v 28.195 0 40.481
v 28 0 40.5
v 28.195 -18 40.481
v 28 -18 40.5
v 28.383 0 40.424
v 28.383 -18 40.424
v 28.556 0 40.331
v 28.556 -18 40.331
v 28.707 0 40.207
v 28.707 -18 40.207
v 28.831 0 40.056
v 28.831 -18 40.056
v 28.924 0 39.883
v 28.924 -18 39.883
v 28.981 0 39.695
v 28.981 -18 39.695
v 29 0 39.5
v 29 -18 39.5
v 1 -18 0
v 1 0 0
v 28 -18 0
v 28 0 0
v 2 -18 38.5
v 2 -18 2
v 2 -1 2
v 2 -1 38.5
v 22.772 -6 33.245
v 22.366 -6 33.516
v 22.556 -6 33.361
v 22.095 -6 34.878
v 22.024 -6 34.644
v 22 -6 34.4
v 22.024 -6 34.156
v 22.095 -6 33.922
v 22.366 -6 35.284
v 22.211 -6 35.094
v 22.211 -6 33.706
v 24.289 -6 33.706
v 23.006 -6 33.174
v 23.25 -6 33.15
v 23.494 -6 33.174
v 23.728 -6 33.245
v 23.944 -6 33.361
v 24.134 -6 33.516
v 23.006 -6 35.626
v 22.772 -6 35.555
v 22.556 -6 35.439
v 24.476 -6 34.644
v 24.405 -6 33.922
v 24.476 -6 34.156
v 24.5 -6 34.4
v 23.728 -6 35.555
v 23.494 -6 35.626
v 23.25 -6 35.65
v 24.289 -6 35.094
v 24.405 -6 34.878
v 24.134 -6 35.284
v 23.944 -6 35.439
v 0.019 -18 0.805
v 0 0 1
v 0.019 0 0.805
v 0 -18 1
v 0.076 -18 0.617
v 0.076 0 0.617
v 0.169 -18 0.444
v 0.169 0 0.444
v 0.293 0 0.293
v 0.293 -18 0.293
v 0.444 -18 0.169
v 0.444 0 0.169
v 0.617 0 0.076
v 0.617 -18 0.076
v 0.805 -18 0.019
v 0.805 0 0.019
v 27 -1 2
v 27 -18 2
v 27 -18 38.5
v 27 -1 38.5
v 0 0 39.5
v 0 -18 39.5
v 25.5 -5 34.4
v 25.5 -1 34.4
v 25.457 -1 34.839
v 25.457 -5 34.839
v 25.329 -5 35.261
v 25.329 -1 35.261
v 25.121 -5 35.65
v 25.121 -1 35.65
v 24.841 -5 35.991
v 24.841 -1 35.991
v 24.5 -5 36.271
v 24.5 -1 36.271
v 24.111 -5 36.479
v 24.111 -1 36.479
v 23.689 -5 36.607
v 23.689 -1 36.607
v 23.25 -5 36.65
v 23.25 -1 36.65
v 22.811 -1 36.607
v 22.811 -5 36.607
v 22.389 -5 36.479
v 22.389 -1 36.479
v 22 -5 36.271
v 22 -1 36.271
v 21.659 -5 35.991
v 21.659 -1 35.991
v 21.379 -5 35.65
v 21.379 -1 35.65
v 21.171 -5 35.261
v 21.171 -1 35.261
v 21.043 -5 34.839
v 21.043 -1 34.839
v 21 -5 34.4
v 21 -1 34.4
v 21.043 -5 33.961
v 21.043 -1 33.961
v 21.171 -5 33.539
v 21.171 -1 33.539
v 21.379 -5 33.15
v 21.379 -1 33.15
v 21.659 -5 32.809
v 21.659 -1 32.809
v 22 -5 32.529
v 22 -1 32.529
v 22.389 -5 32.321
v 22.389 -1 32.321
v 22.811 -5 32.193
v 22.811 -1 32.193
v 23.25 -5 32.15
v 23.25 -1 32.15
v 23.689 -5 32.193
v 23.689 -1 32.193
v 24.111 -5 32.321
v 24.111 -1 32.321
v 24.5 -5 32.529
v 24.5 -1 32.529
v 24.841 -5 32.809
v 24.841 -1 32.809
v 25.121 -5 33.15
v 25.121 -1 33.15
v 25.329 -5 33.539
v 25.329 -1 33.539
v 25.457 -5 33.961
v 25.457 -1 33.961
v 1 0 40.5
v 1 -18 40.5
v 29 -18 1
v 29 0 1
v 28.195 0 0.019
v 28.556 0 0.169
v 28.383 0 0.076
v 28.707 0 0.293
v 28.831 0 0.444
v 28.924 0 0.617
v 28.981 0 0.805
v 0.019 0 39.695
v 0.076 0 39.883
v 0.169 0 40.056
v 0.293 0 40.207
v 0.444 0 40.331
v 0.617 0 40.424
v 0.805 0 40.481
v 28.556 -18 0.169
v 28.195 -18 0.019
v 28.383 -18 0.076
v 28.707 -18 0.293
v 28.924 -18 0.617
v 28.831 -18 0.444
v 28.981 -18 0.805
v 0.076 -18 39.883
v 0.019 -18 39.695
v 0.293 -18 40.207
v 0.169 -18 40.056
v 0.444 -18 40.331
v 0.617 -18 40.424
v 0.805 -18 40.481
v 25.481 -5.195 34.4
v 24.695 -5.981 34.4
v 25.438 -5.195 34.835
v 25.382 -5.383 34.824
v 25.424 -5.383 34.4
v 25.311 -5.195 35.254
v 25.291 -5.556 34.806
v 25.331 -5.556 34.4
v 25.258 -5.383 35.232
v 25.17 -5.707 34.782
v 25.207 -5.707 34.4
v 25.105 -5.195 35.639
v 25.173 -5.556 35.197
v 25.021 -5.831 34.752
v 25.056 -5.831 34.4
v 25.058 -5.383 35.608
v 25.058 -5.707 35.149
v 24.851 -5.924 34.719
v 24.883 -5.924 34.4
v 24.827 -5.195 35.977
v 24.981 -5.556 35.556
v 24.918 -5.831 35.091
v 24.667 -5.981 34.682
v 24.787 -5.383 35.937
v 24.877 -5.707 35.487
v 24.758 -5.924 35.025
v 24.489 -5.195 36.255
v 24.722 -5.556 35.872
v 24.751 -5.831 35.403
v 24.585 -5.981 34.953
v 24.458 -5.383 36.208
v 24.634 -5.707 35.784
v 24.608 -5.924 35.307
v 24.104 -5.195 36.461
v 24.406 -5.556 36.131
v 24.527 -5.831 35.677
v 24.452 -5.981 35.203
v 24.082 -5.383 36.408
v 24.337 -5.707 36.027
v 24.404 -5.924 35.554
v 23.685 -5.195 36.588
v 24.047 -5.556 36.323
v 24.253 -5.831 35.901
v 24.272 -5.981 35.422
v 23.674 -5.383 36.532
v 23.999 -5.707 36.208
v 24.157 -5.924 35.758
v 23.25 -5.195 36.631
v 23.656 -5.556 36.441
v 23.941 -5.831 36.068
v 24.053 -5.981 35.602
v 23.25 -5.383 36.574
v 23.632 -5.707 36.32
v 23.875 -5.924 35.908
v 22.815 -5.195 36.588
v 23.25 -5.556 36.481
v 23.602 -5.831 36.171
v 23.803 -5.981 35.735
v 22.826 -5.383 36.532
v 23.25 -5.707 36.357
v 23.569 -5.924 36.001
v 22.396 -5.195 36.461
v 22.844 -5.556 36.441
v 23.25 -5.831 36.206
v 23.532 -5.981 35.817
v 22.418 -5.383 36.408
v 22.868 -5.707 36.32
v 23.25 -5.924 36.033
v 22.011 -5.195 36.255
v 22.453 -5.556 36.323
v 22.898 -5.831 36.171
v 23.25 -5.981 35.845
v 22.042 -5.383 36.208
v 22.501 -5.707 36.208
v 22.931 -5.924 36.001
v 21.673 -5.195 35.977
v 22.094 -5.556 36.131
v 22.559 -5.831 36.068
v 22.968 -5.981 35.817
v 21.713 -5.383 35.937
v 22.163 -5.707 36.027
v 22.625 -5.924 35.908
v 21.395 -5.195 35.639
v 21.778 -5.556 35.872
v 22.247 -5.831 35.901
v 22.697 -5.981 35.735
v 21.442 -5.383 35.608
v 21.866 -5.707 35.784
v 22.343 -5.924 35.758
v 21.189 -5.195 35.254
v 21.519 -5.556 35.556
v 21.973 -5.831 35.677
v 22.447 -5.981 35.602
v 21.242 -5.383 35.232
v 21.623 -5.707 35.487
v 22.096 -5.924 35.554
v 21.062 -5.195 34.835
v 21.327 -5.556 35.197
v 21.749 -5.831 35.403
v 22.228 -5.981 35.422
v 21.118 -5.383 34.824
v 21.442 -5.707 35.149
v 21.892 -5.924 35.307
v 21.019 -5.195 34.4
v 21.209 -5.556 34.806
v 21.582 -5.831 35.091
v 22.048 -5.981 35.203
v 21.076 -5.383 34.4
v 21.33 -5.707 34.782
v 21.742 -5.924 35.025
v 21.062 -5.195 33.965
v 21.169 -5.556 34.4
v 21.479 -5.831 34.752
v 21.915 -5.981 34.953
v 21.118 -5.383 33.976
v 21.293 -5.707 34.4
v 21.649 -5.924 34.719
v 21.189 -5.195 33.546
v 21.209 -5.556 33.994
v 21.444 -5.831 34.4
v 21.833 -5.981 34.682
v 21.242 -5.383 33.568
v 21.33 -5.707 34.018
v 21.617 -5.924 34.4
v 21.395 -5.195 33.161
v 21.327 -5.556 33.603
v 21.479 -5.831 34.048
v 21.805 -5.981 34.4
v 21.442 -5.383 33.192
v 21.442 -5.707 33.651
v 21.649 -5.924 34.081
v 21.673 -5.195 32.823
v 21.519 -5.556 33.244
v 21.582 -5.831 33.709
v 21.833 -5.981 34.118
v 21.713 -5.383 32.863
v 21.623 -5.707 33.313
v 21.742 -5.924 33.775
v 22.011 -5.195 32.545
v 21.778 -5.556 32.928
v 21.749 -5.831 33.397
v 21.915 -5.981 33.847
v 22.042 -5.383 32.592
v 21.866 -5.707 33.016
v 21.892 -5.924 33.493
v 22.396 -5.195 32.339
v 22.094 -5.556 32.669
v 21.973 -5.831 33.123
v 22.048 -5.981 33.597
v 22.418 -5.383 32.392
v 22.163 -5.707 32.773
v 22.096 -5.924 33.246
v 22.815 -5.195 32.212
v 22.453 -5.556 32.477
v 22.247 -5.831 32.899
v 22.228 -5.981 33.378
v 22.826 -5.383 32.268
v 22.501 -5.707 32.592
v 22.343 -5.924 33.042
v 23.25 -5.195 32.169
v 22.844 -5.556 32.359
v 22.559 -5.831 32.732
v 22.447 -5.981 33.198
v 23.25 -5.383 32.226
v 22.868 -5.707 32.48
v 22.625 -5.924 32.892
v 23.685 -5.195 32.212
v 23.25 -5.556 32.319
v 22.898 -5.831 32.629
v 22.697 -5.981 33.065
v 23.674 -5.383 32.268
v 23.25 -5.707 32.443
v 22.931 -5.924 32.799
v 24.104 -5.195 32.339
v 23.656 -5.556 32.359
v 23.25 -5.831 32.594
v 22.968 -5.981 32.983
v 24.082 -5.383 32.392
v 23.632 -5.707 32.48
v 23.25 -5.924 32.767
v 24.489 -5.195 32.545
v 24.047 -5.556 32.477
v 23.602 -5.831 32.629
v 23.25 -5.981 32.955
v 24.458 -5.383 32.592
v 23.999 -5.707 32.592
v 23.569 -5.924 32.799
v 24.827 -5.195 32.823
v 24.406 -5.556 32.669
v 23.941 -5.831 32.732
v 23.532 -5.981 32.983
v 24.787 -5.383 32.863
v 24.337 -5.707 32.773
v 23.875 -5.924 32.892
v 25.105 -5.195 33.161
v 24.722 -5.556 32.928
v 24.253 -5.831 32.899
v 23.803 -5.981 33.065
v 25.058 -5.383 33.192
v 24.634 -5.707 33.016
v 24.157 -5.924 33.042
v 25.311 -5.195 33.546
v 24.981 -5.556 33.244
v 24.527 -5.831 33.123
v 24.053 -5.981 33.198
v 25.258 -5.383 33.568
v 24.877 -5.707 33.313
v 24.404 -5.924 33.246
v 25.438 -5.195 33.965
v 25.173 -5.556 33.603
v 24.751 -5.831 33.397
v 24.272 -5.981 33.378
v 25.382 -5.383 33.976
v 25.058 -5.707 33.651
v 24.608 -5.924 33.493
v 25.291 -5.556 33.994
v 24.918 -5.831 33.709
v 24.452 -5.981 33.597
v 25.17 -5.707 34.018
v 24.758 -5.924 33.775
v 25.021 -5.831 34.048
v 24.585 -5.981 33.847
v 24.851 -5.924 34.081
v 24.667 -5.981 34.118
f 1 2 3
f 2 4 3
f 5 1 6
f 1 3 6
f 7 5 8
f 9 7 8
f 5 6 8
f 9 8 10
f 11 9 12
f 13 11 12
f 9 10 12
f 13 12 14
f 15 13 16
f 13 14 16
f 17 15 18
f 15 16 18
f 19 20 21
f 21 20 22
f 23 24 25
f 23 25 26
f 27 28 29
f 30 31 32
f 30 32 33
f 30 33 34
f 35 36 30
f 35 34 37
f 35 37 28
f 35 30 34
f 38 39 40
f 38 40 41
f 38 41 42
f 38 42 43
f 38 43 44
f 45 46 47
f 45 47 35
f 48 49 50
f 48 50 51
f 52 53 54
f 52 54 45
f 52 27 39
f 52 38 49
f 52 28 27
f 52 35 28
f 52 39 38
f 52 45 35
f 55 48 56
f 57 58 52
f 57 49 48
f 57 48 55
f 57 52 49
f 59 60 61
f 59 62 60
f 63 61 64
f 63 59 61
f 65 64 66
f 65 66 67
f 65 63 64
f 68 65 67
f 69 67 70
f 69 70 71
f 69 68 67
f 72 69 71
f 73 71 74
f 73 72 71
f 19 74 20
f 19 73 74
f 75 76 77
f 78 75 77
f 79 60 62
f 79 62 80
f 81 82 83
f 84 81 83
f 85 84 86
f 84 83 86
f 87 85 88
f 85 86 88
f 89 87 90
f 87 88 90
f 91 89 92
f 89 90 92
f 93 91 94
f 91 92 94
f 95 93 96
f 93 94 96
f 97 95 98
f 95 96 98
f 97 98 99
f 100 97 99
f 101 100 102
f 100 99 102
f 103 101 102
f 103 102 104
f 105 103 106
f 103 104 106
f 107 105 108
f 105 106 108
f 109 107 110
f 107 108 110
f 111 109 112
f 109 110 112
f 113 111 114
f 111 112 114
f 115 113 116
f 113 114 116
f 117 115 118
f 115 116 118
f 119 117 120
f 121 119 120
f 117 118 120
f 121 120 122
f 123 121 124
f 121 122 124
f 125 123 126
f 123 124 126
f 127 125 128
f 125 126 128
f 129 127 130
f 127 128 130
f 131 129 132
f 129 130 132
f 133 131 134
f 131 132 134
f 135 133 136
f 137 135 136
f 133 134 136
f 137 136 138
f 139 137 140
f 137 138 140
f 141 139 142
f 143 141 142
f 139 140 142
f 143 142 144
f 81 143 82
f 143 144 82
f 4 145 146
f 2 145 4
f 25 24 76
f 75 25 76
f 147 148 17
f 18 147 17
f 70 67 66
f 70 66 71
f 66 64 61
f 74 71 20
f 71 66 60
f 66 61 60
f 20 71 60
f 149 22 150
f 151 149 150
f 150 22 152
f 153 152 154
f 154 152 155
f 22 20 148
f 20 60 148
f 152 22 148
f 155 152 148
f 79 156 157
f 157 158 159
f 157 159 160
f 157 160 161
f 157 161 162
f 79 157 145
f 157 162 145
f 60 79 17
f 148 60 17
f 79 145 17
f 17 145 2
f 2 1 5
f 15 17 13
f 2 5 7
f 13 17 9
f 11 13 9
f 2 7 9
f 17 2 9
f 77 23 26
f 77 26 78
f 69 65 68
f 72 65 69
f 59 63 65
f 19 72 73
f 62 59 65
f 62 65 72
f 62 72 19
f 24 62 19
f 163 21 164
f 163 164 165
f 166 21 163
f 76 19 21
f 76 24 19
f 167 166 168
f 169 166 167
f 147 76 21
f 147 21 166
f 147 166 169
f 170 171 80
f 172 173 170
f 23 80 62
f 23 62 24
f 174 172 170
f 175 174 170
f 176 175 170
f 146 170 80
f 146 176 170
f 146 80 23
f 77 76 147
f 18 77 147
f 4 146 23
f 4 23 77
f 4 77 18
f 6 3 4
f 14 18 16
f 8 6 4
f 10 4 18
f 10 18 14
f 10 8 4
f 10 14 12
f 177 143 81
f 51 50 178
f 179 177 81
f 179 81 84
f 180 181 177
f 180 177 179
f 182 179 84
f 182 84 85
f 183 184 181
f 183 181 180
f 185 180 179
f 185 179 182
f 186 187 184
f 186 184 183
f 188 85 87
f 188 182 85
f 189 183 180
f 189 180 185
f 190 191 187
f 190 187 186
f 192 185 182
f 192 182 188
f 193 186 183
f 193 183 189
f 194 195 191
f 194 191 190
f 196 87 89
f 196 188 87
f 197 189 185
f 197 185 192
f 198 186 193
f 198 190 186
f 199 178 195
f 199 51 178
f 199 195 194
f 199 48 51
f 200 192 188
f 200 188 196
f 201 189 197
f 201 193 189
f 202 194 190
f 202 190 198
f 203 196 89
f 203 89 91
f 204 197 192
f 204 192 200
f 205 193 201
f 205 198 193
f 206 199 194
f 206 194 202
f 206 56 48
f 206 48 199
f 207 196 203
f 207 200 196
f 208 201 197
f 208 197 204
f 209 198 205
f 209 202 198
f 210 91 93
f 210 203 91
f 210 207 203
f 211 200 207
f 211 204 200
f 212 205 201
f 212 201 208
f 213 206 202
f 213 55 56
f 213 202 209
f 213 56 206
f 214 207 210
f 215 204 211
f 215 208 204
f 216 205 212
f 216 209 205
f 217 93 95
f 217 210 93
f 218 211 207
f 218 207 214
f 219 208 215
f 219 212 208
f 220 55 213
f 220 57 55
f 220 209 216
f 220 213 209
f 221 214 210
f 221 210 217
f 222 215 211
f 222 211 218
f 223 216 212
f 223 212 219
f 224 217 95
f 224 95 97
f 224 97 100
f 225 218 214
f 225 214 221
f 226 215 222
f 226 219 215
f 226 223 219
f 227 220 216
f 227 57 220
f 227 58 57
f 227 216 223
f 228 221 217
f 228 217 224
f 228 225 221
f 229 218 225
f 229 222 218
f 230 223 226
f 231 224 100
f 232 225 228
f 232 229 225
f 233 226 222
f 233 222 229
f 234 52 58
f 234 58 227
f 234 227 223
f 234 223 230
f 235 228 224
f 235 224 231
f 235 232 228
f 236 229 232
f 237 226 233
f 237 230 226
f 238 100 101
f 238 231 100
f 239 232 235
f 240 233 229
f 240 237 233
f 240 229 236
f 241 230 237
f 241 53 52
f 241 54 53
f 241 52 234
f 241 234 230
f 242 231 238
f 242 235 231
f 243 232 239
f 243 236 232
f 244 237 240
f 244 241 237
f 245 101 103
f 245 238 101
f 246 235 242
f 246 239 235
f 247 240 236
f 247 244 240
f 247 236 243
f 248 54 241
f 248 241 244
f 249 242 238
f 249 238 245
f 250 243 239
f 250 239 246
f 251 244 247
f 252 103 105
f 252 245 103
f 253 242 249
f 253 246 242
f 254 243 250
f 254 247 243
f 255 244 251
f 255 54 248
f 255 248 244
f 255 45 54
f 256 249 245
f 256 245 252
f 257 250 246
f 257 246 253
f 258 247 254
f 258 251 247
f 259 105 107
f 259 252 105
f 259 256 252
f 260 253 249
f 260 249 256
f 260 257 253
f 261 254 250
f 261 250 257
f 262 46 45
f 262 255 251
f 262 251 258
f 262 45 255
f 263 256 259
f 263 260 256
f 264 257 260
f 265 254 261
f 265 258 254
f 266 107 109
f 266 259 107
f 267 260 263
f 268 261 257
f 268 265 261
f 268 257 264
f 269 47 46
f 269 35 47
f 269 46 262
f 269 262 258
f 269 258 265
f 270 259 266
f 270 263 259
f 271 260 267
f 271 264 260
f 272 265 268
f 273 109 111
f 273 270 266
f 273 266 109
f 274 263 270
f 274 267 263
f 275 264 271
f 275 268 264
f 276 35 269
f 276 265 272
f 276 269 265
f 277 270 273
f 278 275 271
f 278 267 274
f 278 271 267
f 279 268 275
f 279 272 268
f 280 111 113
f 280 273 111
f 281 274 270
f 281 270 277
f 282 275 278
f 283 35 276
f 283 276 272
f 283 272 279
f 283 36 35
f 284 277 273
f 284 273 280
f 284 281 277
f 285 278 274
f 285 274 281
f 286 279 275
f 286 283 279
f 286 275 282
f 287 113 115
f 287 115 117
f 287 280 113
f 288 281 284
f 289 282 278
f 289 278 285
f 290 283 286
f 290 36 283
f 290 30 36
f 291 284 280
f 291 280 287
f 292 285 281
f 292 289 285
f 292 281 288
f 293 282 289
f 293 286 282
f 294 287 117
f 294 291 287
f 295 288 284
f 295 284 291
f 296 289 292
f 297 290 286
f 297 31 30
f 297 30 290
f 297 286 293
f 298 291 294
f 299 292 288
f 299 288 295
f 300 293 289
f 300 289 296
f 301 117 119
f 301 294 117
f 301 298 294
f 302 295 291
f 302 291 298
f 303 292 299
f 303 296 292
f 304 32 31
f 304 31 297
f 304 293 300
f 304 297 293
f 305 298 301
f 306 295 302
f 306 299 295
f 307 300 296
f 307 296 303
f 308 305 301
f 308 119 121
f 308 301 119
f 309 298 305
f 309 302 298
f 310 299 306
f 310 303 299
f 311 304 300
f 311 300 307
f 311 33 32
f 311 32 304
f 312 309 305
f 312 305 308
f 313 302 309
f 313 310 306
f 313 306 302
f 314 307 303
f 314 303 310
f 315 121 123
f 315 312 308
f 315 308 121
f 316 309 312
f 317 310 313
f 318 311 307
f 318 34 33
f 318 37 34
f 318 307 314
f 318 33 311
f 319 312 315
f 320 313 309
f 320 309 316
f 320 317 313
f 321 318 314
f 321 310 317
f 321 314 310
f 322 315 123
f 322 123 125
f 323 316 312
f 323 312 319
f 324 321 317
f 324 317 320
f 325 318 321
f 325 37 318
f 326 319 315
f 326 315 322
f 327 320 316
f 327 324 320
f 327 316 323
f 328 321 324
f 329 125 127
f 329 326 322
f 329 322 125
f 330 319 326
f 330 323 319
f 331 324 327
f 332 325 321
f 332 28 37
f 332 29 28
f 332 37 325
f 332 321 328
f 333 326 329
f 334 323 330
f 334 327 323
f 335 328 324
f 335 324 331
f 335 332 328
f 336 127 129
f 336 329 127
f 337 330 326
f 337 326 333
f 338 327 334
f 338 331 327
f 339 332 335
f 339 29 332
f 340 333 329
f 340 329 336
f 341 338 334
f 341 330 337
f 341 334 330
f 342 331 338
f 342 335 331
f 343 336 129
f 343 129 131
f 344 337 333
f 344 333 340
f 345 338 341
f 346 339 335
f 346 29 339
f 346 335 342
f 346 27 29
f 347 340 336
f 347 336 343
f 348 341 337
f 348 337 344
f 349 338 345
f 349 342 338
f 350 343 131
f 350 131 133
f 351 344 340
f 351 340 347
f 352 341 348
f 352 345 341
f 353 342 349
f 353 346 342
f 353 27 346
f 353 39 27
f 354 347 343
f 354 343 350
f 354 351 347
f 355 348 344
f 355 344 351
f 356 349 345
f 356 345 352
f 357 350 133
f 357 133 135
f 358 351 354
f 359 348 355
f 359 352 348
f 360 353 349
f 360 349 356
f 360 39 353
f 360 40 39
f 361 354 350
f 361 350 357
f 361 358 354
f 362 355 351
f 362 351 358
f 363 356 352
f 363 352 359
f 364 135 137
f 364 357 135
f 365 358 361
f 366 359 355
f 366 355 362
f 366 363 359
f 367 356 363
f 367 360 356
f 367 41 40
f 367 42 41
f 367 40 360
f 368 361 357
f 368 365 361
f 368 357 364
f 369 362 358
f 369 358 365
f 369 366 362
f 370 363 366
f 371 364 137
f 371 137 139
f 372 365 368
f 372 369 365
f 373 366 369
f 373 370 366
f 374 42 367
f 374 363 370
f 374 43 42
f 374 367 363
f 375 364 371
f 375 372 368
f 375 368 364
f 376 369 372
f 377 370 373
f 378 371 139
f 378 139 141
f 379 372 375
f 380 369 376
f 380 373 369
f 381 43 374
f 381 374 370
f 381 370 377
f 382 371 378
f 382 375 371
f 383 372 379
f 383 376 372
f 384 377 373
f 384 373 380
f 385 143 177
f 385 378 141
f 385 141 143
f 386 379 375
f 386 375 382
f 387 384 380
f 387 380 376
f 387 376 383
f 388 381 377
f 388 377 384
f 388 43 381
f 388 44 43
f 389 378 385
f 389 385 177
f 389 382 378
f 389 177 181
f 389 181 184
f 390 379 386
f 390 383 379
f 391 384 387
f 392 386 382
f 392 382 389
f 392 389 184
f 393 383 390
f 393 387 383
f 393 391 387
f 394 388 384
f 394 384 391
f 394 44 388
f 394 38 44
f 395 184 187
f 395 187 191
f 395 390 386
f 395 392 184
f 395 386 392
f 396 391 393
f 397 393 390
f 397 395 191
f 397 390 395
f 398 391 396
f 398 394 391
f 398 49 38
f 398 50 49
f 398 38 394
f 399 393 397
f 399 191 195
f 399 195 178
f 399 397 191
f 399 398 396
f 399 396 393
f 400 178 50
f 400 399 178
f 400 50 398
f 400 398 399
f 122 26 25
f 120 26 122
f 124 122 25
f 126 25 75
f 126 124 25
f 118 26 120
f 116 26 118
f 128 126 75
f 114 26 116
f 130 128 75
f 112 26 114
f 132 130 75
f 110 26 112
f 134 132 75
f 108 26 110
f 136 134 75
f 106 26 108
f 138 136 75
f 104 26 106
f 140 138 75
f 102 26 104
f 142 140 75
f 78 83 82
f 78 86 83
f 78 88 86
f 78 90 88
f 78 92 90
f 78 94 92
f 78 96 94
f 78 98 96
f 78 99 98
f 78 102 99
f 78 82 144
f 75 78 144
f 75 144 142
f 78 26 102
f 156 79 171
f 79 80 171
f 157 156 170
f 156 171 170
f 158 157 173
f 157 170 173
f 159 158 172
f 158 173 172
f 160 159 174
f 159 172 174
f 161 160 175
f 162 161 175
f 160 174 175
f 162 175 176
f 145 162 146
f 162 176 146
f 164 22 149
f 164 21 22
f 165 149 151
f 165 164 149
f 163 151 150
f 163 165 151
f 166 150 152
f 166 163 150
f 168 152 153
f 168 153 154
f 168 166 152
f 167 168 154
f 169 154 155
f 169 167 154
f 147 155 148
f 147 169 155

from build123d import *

# Parameters (mm, degrees)
F0_W     = 29
F0_H     = 40.5
F1_DEPTH = 18
F2_W     = 25
F2_H     = 36.5
F3_DEPTH = 17
F5_R     = 2.25
F6_DEPTH = 5
F7_R     = 1
F8_R     = 1


with BuildPart() as f1:
    # F0 (on Front) → F1 (new body)
    with BuildSketch(Plane.XZ):
        with Locations((14.5, 20.25)):
            Rectangle(F0_W, F0_H)
    extrude(amount=F1_DEPTH)

    # F2 (on face) → F3 (cut)
    with BuildSketch(Plane.XZ.offset(18)):
        with Locations((14.5, 20.25)):
            Rectangle(F2_W, F2_H)
    extrude(amount=-F3_DEPTH, mode=Mode.SUBTRACT)

    # F5 (on face) → F6 (join)
    with BuildSketch(Plane.XZ.offset(1)):
        with Locations((23.25, 34.4)):
            Circle(F5_R)
    extrude(amount=F6_DEPTH)

    # F7
    f7_edges = [f1.edges().sort_by_distance(p)[0] for p in [
        (0, -9, 0),
        (29, -9, 0),
        (0, -9, 40.5),
        (29, -9, 40.5),
    ]]
    fillet(f7_edges, radius=F7_R)

    # F8
    f8_edges = [f1.edges().sort_by_distance(p)[0] for p in [
        (21, -6, 34.4),
    ]]
    fillet(f8_edges, radius=F8_R)


solid = f1.part
